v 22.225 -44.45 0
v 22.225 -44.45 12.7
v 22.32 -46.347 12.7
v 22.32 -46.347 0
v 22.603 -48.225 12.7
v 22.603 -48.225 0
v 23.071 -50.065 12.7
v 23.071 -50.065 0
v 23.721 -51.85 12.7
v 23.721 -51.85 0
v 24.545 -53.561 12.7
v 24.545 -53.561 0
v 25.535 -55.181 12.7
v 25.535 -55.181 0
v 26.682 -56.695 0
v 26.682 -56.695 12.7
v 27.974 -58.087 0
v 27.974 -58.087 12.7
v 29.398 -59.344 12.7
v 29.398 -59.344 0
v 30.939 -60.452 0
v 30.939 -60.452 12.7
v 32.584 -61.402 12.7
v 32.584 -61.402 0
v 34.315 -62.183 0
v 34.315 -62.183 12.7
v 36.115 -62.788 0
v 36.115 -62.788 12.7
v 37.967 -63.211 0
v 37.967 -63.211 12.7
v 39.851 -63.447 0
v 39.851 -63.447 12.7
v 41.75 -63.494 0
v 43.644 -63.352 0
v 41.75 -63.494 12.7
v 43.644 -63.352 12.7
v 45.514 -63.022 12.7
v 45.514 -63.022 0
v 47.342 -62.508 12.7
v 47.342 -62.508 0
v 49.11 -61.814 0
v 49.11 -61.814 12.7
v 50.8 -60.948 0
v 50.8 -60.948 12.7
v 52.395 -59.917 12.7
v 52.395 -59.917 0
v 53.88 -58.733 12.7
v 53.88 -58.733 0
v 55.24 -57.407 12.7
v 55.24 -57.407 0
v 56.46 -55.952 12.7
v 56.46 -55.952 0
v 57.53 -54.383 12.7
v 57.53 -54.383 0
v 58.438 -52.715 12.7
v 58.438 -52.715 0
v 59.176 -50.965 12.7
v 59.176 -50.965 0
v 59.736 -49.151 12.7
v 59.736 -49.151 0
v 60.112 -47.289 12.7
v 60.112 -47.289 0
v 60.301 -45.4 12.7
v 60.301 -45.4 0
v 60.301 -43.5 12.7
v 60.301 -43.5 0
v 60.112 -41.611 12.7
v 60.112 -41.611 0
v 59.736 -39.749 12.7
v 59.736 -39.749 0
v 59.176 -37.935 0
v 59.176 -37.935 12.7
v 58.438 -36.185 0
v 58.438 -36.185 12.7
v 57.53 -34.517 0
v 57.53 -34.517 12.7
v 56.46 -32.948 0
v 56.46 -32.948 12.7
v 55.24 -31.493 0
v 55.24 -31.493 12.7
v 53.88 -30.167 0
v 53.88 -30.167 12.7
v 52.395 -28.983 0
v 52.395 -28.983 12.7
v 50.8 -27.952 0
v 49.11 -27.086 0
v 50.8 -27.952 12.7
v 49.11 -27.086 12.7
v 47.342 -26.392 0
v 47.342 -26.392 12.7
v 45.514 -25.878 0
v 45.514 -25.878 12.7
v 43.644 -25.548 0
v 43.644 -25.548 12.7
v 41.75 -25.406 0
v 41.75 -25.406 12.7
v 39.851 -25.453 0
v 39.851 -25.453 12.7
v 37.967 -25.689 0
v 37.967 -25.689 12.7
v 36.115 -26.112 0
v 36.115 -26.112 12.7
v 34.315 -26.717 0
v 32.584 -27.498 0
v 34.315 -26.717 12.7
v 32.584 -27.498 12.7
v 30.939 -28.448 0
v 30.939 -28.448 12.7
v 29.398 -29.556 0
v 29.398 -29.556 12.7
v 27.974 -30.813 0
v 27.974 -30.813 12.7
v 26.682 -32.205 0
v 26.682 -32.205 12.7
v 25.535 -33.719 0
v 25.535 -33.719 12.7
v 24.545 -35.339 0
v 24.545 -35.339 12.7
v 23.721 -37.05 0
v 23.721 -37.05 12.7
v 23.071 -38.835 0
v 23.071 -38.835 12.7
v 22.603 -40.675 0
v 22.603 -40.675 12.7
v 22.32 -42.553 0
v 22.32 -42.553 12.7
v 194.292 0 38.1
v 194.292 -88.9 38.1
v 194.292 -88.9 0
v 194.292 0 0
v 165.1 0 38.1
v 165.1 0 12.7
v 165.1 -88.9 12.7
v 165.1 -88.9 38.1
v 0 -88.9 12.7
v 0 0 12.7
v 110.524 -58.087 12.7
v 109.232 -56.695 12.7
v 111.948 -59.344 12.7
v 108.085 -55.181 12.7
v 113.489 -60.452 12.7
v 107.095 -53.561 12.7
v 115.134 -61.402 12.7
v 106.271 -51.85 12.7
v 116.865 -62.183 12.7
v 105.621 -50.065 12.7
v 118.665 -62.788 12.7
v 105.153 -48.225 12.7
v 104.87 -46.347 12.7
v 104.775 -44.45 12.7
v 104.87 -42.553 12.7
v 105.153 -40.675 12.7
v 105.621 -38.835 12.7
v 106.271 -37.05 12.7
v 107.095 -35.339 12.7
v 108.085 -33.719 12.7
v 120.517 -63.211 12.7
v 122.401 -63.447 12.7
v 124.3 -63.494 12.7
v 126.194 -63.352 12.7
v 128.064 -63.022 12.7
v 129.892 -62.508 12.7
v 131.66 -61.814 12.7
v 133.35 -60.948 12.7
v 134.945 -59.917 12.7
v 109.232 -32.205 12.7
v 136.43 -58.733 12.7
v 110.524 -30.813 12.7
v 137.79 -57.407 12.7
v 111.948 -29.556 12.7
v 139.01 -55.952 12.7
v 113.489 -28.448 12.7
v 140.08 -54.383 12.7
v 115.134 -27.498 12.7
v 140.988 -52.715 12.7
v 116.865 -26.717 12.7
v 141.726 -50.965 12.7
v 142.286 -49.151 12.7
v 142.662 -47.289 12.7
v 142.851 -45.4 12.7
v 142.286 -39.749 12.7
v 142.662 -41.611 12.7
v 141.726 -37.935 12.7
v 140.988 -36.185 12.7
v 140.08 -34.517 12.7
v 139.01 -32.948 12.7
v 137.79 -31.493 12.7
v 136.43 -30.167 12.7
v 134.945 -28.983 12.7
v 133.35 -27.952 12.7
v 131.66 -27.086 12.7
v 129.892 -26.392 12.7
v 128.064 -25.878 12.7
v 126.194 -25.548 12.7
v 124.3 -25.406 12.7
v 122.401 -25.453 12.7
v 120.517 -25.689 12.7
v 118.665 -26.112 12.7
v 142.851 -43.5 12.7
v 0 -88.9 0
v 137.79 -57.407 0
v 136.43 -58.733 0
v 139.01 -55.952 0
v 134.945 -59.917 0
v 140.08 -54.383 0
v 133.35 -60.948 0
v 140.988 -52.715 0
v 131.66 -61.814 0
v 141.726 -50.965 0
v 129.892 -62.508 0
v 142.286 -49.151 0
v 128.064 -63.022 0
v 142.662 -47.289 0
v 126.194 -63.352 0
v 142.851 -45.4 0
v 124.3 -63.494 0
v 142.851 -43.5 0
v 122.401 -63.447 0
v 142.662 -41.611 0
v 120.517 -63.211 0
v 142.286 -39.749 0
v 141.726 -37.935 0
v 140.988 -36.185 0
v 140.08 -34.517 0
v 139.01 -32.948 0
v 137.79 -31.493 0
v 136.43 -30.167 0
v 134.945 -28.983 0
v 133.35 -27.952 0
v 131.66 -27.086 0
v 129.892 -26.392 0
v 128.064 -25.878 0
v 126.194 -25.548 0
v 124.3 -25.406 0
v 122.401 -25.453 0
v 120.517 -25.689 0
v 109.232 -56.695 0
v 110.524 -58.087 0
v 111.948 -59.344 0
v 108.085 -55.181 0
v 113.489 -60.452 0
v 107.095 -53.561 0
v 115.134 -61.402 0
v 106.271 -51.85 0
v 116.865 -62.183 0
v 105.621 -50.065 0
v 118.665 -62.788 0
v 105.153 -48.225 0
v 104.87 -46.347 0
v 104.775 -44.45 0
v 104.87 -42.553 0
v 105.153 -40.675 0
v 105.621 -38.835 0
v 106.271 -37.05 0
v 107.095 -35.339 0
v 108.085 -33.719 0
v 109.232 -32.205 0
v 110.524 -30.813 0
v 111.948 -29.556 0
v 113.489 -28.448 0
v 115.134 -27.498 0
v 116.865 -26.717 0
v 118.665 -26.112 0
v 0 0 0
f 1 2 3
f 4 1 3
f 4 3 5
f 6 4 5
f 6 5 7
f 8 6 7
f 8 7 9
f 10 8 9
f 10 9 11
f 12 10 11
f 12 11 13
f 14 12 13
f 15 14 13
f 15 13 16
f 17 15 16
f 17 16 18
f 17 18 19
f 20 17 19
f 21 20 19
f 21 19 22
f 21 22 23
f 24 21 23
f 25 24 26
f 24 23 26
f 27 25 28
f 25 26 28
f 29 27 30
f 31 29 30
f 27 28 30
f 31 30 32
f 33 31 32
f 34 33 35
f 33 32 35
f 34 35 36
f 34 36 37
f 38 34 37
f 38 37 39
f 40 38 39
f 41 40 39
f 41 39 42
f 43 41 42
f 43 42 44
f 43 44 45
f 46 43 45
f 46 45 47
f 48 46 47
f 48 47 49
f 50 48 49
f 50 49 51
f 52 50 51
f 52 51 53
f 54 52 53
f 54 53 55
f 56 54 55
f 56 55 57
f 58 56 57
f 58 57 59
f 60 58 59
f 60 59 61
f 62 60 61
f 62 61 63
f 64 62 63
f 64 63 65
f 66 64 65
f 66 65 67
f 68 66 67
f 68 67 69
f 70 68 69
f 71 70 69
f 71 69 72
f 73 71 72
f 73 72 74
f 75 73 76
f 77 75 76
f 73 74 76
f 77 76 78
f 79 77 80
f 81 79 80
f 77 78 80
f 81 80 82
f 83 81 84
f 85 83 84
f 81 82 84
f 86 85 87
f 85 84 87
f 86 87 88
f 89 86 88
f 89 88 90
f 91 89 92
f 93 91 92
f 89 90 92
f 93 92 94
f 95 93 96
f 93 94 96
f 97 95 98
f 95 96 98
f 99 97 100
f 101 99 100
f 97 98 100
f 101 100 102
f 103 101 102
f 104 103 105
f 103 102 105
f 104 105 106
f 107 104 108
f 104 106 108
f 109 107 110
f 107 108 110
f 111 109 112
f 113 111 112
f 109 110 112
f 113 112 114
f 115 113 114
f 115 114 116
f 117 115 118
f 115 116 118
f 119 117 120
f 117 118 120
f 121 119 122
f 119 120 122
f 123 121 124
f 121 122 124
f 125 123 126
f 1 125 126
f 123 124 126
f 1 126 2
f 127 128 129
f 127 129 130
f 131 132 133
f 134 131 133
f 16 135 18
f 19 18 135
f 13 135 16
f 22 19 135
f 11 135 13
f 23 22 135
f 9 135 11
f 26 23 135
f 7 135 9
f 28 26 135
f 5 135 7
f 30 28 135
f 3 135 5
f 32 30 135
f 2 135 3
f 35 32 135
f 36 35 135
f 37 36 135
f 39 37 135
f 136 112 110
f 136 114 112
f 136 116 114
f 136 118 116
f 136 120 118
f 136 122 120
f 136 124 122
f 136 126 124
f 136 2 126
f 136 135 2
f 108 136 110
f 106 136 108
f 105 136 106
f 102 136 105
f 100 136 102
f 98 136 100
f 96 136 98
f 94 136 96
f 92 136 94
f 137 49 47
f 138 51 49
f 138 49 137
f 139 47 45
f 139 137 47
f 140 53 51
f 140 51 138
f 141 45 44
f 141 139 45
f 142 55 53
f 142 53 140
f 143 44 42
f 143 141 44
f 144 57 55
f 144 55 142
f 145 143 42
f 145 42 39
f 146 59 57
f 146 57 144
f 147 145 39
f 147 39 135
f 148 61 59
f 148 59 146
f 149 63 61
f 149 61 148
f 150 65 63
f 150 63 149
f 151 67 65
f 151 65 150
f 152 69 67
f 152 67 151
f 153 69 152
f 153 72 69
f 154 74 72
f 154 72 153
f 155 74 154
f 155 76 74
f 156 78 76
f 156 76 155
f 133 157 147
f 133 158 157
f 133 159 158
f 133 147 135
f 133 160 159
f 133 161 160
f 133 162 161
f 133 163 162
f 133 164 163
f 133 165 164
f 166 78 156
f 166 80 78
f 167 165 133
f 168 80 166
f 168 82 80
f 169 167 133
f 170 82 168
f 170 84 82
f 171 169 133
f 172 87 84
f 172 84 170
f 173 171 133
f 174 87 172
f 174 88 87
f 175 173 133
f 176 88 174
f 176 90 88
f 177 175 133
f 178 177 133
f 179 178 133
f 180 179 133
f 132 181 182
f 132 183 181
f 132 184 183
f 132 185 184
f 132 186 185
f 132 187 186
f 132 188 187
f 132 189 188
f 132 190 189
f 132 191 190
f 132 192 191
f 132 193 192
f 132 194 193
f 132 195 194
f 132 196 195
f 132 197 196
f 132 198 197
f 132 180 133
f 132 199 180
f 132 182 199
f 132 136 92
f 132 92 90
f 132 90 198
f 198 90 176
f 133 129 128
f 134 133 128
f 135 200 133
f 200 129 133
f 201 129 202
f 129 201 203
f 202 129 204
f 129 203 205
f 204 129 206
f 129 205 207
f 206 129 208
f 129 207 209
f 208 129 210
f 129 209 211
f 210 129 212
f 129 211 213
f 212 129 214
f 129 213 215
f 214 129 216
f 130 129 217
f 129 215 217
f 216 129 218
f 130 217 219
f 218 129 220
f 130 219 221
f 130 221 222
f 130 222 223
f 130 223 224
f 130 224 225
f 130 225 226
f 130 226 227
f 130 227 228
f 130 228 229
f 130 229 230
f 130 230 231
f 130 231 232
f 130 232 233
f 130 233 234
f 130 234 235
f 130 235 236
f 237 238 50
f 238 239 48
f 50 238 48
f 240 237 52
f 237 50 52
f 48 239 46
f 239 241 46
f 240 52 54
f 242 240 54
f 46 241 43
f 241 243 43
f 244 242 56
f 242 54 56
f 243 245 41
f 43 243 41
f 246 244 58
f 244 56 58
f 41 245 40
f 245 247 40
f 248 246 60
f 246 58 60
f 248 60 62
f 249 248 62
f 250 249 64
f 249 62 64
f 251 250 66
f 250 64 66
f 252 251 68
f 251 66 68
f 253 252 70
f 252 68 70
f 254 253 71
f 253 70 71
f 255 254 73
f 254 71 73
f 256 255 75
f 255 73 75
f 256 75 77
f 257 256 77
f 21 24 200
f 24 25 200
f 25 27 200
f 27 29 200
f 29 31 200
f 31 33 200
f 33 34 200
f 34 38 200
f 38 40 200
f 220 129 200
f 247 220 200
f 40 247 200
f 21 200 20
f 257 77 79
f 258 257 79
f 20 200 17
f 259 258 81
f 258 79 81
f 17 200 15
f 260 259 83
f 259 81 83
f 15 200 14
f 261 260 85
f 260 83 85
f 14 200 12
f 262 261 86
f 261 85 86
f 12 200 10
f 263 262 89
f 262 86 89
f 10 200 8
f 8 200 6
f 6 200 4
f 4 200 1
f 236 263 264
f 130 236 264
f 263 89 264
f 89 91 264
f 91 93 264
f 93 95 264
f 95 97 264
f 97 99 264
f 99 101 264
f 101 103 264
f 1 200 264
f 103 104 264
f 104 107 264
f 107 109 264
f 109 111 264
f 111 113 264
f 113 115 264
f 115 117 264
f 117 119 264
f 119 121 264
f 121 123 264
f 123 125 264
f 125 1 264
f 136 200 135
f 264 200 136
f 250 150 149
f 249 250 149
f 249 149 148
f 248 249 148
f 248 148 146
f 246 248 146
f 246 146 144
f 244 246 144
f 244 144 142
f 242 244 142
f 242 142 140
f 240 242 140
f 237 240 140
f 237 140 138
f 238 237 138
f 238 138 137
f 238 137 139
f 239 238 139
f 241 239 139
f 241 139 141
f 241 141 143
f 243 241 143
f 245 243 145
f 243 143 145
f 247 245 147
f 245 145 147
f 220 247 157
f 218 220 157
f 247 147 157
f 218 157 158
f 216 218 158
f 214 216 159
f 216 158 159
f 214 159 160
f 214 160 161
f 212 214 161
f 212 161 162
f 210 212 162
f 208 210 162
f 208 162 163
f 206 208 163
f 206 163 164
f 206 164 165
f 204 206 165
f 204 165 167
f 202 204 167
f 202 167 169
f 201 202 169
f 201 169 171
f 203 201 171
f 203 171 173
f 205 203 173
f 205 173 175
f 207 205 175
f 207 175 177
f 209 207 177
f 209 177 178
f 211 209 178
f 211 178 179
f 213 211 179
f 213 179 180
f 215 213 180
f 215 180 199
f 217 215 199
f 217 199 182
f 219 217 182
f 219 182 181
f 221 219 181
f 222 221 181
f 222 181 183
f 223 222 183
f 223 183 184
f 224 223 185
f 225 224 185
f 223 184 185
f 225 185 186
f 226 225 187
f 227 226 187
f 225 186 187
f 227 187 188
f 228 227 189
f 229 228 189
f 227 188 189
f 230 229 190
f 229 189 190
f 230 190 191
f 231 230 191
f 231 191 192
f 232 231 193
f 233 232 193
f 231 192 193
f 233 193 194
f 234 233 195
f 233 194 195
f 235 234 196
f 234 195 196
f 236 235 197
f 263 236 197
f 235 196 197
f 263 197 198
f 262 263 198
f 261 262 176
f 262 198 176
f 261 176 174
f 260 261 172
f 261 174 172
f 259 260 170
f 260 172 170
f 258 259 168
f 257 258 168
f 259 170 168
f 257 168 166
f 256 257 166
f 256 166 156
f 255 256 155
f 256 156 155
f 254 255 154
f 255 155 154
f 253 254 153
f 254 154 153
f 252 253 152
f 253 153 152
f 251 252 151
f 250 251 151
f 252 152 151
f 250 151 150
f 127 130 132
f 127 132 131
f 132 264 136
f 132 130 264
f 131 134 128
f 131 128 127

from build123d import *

# Parameters (mm, degrees)
F0_W     = 82.55
F0_H     = 88.9
F1_DEPTH = 12.7
F3_D     = 38.1
F4_W     = 5.5692129374
F4_H     = 88.9
F5_DEPTH = 38.1
F6_W     = 88.9
F6_H     = 38.1
F7_DEPTH = 23.6223284155


with BuildPart() as f1:
    # F0 (on Top) → F1 (new body)
    with BuildSketch(Plane.XY):
        with Locations((41.275, -44.45)):
            Rectangle(F0_W, F0_H)
        with Locations((123.825, -44.45)):
            Rectangle(F0_W, F0_H)
    extrude(amount=F1_DEPTH)

    # F3 (through all)
    with Locations(Plane(origin=(0, 0, 0), x_dir=(1, 0, 0), z_dir=(0, 0, -1))):
        with Locations((123.825, 44.45), (41.275, 44.45)):
            Hole(F3_D / 2)

    # F4 (on face) → F5 (join)
    with BuildSketch(Plane(origin=(0, 0, 0), x_dir=(1, 0, 0), z_dir=(0, 0, -1))):
        with Locations((167.8846064687, 44.45)):
            Rectangle(F4_W, F4_H)
    extrude(amount=-F5_DEPTH)

    # F6 (on face) → F7 (join)
    with BuildSketch(Plane.YZ.offset(170.6692129374)):
        with Locations((-44.45, 19.05)):
            Rectangle(F6_W, F6_H)
    extrude(amount=F7_DEPTH)


solid = f1.part
